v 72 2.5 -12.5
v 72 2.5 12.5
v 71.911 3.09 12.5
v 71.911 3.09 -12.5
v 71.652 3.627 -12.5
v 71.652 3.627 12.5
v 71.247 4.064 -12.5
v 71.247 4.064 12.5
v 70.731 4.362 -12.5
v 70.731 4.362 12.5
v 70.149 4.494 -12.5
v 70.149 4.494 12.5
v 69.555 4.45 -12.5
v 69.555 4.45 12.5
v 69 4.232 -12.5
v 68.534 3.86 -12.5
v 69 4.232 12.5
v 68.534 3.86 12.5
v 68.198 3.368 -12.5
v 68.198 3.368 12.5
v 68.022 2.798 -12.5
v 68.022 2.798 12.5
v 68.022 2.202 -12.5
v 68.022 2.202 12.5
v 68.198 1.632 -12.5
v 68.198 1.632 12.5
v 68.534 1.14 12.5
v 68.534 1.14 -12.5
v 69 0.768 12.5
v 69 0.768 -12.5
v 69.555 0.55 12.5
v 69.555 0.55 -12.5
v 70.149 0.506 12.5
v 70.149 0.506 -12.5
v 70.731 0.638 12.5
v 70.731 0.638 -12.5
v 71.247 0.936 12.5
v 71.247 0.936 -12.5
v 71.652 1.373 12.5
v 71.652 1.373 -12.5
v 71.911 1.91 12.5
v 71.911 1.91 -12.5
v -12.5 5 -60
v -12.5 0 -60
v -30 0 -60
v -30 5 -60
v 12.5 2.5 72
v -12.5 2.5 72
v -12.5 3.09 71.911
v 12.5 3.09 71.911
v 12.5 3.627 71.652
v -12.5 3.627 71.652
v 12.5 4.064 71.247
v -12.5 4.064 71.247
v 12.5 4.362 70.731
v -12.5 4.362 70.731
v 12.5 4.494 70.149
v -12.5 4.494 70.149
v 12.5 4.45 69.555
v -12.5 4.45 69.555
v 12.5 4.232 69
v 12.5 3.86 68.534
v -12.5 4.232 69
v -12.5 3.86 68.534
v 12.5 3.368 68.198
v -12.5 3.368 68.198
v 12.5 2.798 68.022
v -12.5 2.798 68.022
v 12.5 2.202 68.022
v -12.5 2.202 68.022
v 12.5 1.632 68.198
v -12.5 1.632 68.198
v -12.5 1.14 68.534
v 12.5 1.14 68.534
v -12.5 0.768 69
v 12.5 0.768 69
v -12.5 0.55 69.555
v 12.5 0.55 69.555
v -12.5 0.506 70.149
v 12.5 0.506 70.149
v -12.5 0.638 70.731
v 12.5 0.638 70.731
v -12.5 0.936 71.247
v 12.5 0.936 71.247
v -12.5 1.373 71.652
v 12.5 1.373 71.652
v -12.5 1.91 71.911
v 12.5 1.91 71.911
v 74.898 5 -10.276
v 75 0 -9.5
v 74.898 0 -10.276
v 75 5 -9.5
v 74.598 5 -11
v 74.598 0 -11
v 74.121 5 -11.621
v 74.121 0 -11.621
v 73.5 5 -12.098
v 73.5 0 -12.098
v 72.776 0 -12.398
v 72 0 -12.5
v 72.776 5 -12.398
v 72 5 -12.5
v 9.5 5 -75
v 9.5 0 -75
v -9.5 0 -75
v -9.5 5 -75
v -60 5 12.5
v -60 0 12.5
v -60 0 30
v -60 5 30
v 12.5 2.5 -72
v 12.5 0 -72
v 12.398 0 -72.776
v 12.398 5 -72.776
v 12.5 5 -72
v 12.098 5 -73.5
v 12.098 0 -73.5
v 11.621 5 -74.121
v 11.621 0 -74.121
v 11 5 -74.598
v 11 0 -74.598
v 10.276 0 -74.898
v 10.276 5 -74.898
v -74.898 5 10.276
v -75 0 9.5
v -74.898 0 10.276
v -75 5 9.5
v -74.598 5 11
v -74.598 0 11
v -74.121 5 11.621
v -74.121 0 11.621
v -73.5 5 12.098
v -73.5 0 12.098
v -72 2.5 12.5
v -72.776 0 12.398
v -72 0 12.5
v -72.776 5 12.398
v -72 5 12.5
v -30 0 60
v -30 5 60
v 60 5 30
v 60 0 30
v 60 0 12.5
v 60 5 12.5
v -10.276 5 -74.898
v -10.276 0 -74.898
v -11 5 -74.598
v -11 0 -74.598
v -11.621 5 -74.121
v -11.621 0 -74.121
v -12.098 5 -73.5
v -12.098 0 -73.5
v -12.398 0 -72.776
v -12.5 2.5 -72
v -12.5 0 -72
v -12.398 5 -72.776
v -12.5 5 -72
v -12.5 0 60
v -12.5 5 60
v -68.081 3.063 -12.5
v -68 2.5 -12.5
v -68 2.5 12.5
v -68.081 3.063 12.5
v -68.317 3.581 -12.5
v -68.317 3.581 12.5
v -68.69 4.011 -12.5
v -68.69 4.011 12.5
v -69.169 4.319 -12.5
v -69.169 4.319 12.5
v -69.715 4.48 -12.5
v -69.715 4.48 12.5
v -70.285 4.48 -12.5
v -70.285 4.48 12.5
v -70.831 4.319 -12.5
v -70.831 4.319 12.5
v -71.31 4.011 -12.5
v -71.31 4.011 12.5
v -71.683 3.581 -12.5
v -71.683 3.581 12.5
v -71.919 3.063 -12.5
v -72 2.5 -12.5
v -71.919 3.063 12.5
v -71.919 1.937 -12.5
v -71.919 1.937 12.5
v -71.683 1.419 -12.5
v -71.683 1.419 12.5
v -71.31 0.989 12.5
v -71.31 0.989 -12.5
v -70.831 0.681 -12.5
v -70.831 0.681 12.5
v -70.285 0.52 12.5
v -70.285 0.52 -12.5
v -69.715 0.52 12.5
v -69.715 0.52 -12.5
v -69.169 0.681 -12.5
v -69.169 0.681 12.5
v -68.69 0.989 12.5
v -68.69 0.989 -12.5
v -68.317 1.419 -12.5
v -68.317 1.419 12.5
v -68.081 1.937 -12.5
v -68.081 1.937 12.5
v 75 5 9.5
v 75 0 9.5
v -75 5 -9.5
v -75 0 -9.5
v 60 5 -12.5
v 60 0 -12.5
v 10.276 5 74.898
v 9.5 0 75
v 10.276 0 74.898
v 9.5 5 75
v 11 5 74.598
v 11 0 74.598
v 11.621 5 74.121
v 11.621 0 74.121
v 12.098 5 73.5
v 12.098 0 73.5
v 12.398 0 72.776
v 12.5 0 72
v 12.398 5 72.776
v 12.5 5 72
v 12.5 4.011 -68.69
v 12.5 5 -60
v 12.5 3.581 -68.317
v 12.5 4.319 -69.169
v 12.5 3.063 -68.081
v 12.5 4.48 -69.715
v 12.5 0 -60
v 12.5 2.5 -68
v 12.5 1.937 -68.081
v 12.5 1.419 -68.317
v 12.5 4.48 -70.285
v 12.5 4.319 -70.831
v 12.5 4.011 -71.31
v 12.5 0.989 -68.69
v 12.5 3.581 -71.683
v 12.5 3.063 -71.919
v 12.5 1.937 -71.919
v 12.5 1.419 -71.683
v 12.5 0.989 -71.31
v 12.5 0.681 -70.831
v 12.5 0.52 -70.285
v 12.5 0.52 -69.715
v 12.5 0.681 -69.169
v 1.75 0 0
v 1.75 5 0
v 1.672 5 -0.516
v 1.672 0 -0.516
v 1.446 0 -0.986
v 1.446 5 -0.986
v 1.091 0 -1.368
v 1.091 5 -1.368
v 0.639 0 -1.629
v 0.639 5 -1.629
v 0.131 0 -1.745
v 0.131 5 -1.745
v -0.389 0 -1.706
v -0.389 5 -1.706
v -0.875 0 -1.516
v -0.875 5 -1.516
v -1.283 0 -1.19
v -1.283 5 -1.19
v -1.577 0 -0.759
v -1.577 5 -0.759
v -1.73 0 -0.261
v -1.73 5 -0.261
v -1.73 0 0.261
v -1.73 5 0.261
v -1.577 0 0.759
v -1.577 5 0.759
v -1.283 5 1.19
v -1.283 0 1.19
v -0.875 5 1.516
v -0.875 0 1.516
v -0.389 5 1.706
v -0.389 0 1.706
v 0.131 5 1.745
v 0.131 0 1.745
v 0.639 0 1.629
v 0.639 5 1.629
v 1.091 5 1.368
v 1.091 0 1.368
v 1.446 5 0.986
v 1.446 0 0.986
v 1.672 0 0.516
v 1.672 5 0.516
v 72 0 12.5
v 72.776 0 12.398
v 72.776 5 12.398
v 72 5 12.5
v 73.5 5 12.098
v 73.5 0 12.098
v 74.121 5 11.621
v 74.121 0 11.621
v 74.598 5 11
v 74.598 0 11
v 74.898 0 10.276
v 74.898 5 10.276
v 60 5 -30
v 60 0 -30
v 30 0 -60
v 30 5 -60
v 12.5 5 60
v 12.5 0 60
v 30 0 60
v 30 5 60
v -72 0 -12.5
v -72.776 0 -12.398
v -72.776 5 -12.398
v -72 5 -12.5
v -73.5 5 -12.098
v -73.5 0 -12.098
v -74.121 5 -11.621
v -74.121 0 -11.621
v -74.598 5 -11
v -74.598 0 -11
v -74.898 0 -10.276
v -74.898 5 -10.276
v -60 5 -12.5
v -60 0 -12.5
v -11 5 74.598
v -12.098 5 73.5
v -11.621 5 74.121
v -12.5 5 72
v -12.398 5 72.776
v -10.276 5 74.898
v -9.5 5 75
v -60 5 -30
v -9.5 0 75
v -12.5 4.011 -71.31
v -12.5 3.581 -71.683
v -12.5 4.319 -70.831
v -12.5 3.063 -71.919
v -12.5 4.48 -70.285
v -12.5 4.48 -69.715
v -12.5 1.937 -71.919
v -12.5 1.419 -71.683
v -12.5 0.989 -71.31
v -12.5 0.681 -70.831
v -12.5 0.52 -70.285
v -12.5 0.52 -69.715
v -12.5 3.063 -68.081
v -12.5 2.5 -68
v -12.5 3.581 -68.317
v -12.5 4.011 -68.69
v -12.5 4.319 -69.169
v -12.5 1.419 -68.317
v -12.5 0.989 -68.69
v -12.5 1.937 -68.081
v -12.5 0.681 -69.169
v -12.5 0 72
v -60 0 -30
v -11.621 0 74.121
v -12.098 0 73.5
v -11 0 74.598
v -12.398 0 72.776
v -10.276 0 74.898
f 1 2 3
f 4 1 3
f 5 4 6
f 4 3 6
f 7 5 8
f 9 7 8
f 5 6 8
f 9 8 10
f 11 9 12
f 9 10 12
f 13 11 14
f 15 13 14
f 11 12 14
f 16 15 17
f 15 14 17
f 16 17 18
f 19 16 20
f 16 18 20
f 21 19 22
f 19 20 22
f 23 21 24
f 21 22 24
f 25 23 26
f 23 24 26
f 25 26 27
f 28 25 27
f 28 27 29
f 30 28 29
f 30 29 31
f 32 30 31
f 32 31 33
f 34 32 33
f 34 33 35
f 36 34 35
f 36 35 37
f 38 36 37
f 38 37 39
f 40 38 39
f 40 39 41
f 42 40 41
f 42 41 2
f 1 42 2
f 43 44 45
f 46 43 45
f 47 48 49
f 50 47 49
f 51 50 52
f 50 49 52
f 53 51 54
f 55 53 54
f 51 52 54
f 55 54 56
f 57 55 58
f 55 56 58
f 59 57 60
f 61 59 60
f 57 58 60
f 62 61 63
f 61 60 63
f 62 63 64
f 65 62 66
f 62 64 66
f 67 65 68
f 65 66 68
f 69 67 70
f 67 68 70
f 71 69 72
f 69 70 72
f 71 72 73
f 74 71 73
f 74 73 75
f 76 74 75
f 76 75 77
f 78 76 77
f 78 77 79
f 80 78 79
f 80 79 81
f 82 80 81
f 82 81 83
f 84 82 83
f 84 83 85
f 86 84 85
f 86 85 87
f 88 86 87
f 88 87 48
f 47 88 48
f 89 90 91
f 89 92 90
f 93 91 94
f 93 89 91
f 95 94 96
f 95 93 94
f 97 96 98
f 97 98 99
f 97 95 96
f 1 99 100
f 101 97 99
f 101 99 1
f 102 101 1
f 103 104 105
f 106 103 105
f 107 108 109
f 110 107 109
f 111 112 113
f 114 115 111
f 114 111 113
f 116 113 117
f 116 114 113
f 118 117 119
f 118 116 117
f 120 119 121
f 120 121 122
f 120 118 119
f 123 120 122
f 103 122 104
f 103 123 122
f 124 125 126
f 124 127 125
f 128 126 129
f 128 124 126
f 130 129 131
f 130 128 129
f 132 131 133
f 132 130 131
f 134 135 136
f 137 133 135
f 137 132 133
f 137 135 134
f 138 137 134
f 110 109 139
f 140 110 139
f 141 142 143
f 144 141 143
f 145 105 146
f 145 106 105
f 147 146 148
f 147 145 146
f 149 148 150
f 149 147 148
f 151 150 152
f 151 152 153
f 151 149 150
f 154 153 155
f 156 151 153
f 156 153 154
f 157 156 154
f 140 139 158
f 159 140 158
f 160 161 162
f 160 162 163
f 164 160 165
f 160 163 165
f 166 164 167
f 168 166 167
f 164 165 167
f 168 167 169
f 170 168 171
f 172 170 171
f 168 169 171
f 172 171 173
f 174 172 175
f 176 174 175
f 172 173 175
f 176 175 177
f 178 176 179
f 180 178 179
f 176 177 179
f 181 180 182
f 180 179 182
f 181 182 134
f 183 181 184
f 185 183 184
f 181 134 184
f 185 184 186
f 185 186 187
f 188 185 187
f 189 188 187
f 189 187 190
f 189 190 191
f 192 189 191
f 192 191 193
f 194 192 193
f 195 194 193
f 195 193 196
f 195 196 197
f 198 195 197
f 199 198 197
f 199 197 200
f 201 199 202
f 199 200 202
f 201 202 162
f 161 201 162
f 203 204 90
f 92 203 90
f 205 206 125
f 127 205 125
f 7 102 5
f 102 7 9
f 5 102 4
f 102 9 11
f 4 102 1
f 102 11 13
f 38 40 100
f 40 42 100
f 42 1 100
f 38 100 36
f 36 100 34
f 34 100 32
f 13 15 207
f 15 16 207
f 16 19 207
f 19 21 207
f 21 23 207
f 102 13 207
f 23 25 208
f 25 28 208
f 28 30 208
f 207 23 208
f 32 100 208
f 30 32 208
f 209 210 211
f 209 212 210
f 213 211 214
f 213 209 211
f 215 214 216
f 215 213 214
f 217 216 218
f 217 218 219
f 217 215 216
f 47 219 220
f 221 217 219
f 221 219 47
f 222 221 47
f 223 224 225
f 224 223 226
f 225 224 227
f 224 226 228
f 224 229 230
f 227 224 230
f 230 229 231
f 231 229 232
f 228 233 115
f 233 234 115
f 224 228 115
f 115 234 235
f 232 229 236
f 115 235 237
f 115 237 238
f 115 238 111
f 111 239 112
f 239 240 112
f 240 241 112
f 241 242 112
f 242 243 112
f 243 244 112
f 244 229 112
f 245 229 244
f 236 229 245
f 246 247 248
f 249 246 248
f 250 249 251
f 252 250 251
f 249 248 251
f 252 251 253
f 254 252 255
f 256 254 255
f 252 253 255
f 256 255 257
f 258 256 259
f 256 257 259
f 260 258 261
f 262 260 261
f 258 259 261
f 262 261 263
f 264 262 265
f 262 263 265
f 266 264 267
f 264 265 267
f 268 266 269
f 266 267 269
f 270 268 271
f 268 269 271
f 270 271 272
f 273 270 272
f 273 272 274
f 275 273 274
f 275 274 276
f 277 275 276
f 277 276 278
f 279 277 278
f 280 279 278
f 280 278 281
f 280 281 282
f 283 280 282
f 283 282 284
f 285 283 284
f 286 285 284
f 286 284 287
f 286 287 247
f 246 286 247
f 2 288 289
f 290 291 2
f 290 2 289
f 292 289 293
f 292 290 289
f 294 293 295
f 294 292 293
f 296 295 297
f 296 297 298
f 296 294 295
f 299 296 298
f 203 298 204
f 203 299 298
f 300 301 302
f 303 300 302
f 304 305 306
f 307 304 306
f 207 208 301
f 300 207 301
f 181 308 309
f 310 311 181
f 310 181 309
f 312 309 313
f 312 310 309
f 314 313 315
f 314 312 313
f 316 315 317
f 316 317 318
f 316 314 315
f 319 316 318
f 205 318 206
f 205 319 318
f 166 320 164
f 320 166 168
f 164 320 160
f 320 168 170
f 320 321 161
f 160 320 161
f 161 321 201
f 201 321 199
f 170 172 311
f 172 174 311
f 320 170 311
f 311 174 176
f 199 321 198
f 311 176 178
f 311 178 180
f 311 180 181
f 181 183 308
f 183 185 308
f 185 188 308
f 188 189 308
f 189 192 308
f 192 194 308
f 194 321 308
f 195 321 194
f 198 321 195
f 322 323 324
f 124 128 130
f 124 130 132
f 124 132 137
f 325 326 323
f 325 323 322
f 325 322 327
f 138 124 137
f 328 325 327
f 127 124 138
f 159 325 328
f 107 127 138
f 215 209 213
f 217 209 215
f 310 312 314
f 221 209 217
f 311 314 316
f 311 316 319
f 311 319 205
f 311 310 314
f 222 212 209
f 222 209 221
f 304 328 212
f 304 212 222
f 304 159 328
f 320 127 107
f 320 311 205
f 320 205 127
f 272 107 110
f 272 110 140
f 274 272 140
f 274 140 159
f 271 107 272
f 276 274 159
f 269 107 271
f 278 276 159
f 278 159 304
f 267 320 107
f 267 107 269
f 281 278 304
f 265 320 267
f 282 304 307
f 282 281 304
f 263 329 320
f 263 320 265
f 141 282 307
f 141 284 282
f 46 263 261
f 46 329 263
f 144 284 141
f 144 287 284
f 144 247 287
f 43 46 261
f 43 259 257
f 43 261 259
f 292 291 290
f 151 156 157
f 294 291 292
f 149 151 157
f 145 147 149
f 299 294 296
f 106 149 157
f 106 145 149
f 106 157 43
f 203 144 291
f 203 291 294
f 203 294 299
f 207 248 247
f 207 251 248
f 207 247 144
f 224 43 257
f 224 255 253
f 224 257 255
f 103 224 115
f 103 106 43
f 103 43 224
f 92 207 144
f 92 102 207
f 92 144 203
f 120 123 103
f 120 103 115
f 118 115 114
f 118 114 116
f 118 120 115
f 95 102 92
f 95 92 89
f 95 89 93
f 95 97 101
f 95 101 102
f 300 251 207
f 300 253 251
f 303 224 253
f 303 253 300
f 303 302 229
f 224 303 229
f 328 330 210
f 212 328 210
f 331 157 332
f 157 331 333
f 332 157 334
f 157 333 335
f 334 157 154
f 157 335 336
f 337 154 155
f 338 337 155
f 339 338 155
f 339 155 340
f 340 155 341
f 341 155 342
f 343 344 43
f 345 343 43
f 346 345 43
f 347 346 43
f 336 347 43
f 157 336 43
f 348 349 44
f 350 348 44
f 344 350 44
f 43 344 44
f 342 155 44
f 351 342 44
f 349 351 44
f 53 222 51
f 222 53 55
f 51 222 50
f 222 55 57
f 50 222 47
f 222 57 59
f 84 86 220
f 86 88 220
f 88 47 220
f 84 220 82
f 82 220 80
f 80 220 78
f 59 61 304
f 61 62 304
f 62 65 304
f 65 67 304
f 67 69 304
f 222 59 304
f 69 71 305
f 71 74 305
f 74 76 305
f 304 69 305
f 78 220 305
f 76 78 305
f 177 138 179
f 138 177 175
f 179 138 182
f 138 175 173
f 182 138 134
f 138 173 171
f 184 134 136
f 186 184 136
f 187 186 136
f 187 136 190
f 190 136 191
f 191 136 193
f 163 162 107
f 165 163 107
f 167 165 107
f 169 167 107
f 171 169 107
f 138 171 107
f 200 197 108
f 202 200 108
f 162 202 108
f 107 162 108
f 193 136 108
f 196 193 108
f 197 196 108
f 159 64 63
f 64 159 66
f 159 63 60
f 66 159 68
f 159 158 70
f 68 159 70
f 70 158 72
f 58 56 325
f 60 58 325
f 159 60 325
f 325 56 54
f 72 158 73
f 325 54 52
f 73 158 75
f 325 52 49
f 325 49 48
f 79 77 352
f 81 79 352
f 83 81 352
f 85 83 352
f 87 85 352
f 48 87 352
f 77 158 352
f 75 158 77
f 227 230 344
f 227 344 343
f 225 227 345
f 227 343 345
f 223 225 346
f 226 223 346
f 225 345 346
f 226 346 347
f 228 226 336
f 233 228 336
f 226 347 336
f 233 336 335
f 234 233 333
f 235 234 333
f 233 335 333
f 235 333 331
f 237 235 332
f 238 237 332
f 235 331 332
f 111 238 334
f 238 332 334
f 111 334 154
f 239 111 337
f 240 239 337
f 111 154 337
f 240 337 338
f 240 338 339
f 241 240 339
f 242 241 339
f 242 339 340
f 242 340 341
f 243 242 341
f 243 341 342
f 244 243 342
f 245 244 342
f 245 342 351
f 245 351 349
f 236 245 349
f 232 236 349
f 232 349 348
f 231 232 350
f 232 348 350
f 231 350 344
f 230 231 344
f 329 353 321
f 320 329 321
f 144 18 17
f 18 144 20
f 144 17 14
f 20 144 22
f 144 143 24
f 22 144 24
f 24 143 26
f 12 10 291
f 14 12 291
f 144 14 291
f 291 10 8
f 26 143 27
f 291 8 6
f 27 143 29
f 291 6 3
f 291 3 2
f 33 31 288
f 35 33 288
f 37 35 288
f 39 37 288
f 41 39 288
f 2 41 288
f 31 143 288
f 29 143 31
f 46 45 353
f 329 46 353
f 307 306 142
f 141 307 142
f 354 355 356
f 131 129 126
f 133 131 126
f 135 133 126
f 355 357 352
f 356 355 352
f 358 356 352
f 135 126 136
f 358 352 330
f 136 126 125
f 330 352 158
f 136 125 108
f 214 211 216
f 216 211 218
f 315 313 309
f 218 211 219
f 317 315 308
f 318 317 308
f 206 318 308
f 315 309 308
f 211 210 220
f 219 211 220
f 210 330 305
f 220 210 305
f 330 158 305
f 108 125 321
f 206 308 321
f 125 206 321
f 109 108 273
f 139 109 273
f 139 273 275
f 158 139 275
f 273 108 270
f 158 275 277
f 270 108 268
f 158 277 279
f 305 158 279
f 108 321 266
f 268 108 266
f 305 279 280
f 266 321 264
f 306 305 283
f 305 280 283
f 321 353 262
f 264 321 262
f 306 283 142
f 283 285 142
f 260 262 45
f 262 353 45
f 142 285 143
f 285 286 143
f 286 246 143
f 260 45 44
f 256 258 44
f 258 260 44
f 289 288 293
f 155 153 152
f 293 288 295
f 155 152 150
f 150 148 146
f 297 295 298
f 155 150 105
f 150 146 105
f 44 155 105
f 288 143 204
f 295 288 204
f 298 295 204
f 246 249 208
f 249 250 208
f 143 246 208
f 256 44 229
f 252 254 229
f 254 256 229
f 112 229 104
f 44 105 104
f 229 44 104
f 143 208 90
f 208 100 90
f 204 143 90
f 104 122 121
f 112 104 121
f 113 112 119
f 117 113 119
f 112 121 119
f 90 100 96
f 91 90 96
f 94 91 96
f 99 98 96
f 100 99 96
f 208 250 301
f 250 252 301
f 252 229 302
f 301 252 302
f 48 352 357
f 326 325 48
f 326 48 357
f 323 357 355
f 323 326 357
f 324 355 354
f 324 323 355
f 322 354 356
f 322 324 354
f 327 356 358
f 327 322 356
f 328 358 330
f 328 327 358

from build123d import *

# Parameters (mm, degrees)
EXTRUDE_1_DEPTH     = 5
FILLET_1_R          = 3
SKETCH_7_R          = 1.75
CUT_EXTRUDE_5_DEPTH = 6
SKETCH_11_R         = 2
CUT_EXTRUDE_6_DEPTH = 88.5
SKETCH_12_R         = 2
CUT_EXTRUDE_7_DEPTH = 88.5


with BuildPart() as part:
    # 스케치1 → 보스-돌출1 (new body)
    with BuildSketch(Plane(origin=(0, 0, 0), x_dir=(1, 0, 0), z_dir=(0, 1, 0))):
        Polygon((-60, -30), (-30, -60), (-12.5, -60), (-12.5, -75), (12.5, -75), (12.5, -60), (30, -60), (60, -30), (60, -12.5), (75, -12.5), (75, 12.5), (60, 12.5), (60, 30), (30, 60), (12.5, 60), (12.5, 75), (-12.5, 75), (-12.5, 60), (-30, 60), (-60, 30), (-60, 12.5), (-75, 12.5), (-75, -12.5), (-60, -12.5), align=None)
    extrude(amount=EXTRUDE_1_DEPTH)

    # 필렛1
    fillet_1_edges = [part.edges().sort_by_distance(p)[0] for p in [
        (-12.5, 2.5, -75),
        (12.5, 2.5, -75),
        (75, 2.5, -12.5),
        (75, 2.5, 12.5),
        (12.5, 2.5, 75),
        (-12.5, 2.5, 75),
        (-75, 2.5, 12.5),
        (-75, 2.5, -12.5),
    ]]
    fillet(fillet_1_edges, radius=FILLET_1_R)

    # 스케치7 → 컷-돌출5 (cut, through all)
    with BuildSketch(Plane(origin=(0, 5, 0), x_dir=(1, 0, 0), z_dir=(0, 1, 0))):
        Circle(SKETCH_7_R)
    extrude(amount=-CUT_EXTRUDE_5_DEPTH, mode=Mode.SUBTRACT)

    # 스케치11 → 컷-돌출6 (cut, through all)
    with BuildSketch(Plane.XY.offset(12.5)):
        with Locations((-70, 2.5)):
            Circle(SKETCH_11_R)
        with Locations((70, 2.5)):
            Circle(SKETCH_11_R)
    extrude(amount=-CUT_EXTRUDE_6_DEPTH, mode=Mode.SUBTRACT)

    # 스케치12 → 컷-돌출7 (cut, through all)
    with BuildSketch(Plane.ZY.offset(12.5)):
        with Locations((-70, 2.5)):
            Circle(SKETCH_12_R)
        with Locations((70, 2.5)):
            Circle(SKETCH_12_R)
    extrude(amount=-CUT_EXTRUDE_7_DEPTH, mode=Mode.SUBTRACT)


solid = part.part
